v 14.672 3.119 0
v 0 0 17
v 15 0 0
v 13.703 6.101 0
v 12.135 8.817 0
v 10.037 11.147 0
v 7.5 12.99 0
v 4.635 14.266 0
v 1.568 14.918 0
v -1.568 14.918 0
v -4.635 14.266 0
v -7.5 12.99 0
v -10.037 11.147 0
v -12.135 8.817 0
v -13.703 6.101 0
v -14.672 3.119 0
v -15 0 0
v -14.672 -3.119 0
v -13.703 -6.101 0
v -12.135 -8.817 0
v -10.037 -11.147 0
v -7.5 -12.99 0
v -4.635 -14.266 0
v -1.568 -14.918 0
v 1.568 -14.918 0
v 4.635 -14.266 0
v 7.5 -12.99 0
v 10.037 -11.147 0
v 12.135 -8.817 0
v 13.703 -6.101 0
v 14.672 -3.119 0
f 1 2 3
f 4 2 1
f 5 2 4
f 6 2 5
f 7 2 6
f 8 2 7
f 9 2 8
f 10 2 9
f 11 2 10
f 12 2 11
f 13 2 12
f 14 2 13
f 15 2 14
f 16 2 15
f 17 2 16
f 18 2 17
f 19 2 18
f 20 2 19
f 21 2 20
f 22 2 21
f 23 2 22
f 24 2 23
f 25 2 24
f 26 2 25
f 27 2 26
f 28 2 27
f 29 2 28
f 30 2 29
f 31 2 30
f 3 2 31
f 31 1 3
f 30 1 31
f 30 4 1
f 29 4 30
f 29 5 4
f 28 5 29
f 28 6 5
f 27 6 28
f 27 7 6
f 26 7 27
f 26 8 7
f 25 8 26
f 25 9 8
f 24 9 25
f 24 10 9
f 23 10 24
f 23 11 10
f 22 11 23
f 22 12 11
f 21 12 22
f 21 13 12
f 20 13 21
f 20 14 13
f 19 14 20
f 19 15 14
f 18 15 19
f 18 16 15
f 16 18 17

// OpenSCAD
// Generated by SolidPython 1.0.1 on 2020-07-29 00:46:43


cylinder(h = 17, r1 = 15, r2 = 0);
/***********************************************
*********      SolidPython code:      **********
************************************************
 
# import packages: SolidPython
from solid import *
from solid.utils import *
from itertools import chain, combinations, permutations


class Resize:

    def __init__(self, scad_file):
        self.scad_file = scad_file
        #self.scad_file = import_scad(scad_file)
        # cone/cylinder param:
        self.r1 = 0
        self.r2 = 0
        self.h = 0
        # rectangular prism param:
        self.w = 0
        self.l = 0
        # ellipse param:
        self.r = 0

    # import OpenScad code (file name corresponds to shape)


    # classify shape + parameters
    def assign(self, param1, param2, param3):
        if self.scad_file == 'cone.scad':
            self.r1 = param1
            self.r2 = param2
            self.h = param3
        elif self.scad_file == 'cylinder.scad':
            self.r1 = param1
            self.r2 = param2
            self.h = param3
        elif self.scad_file == 'rectangularPrism.scad':
            self.h = param1
            self.l = param2
            self.w = param3
        else:
            self.r = param1
            self.h = param2

    # resize parameters
    def iterate(self):
        x = range(3, 20, 2)
        i = 1
        if self.scad_file == 'cone.scad':
            tempList = list(permutations(x, 2))
            for temp in tempList:
                param1 = temp[0]
                param2 = temp[1]
                filepath = 'produced_scad_files/' + 'cone' + str(param1) + '_' + str(param2) + '_' + '.scad'
                scad_render_to_file(cylinder(h=param1, r1=param2, r2=0), filepath)

        elif self.scad_file == 'cylinder.scad':
            tempList = list(permutations(x, 3))
            for temp in tempList:
                param1 = temp[0]
                param2 = temp[1]
                filepath = 'produced_scad_files/' + 'cylinder' + str(param1) + '_' + str(param2) + '_' + '.scad'
                scad_render_to_file(cylinder(h=param1, r1=param2, r2=param2), filepath)

        elif self.scad_file == 'rectangularPrism.scad':
            tempList = list(permutations(x, 3))
            for temp in tempList:
                param1 = temp[0]
                param2 = temp[1]
                param3 = temp[2]
                filepath = 'produced_scad_files/' + 'rectangularPrism' + str(param1) + '_' + str(param2) + '_' + str(
                    param3) + '.scad'
                scad_render_to_file(cube(size=(param1, param2, param3)), filepath)

        elif self.scad_file == 'ellipse.scad':
            tempList = list(permutations(x, 4))
            for temp in tempList:
                param1 = temp[0]
                param2 = temp[1]
                param3 = temp[2]
                param4 = temp[3]
                filepath = 'produced_scad_files/' + 'ellipse' + str(param1) + '_' + str(param2) + '_' + str(param3) + '_' + str(param4) + '.scad'
                scad_render_to_file(scale([param1, param2, param3])(sphere(r=param4)), filepath)

    def render_to_scadfile(self):
        scad_render_to_file(scad, 'example.scad') 
 
************************************************/
